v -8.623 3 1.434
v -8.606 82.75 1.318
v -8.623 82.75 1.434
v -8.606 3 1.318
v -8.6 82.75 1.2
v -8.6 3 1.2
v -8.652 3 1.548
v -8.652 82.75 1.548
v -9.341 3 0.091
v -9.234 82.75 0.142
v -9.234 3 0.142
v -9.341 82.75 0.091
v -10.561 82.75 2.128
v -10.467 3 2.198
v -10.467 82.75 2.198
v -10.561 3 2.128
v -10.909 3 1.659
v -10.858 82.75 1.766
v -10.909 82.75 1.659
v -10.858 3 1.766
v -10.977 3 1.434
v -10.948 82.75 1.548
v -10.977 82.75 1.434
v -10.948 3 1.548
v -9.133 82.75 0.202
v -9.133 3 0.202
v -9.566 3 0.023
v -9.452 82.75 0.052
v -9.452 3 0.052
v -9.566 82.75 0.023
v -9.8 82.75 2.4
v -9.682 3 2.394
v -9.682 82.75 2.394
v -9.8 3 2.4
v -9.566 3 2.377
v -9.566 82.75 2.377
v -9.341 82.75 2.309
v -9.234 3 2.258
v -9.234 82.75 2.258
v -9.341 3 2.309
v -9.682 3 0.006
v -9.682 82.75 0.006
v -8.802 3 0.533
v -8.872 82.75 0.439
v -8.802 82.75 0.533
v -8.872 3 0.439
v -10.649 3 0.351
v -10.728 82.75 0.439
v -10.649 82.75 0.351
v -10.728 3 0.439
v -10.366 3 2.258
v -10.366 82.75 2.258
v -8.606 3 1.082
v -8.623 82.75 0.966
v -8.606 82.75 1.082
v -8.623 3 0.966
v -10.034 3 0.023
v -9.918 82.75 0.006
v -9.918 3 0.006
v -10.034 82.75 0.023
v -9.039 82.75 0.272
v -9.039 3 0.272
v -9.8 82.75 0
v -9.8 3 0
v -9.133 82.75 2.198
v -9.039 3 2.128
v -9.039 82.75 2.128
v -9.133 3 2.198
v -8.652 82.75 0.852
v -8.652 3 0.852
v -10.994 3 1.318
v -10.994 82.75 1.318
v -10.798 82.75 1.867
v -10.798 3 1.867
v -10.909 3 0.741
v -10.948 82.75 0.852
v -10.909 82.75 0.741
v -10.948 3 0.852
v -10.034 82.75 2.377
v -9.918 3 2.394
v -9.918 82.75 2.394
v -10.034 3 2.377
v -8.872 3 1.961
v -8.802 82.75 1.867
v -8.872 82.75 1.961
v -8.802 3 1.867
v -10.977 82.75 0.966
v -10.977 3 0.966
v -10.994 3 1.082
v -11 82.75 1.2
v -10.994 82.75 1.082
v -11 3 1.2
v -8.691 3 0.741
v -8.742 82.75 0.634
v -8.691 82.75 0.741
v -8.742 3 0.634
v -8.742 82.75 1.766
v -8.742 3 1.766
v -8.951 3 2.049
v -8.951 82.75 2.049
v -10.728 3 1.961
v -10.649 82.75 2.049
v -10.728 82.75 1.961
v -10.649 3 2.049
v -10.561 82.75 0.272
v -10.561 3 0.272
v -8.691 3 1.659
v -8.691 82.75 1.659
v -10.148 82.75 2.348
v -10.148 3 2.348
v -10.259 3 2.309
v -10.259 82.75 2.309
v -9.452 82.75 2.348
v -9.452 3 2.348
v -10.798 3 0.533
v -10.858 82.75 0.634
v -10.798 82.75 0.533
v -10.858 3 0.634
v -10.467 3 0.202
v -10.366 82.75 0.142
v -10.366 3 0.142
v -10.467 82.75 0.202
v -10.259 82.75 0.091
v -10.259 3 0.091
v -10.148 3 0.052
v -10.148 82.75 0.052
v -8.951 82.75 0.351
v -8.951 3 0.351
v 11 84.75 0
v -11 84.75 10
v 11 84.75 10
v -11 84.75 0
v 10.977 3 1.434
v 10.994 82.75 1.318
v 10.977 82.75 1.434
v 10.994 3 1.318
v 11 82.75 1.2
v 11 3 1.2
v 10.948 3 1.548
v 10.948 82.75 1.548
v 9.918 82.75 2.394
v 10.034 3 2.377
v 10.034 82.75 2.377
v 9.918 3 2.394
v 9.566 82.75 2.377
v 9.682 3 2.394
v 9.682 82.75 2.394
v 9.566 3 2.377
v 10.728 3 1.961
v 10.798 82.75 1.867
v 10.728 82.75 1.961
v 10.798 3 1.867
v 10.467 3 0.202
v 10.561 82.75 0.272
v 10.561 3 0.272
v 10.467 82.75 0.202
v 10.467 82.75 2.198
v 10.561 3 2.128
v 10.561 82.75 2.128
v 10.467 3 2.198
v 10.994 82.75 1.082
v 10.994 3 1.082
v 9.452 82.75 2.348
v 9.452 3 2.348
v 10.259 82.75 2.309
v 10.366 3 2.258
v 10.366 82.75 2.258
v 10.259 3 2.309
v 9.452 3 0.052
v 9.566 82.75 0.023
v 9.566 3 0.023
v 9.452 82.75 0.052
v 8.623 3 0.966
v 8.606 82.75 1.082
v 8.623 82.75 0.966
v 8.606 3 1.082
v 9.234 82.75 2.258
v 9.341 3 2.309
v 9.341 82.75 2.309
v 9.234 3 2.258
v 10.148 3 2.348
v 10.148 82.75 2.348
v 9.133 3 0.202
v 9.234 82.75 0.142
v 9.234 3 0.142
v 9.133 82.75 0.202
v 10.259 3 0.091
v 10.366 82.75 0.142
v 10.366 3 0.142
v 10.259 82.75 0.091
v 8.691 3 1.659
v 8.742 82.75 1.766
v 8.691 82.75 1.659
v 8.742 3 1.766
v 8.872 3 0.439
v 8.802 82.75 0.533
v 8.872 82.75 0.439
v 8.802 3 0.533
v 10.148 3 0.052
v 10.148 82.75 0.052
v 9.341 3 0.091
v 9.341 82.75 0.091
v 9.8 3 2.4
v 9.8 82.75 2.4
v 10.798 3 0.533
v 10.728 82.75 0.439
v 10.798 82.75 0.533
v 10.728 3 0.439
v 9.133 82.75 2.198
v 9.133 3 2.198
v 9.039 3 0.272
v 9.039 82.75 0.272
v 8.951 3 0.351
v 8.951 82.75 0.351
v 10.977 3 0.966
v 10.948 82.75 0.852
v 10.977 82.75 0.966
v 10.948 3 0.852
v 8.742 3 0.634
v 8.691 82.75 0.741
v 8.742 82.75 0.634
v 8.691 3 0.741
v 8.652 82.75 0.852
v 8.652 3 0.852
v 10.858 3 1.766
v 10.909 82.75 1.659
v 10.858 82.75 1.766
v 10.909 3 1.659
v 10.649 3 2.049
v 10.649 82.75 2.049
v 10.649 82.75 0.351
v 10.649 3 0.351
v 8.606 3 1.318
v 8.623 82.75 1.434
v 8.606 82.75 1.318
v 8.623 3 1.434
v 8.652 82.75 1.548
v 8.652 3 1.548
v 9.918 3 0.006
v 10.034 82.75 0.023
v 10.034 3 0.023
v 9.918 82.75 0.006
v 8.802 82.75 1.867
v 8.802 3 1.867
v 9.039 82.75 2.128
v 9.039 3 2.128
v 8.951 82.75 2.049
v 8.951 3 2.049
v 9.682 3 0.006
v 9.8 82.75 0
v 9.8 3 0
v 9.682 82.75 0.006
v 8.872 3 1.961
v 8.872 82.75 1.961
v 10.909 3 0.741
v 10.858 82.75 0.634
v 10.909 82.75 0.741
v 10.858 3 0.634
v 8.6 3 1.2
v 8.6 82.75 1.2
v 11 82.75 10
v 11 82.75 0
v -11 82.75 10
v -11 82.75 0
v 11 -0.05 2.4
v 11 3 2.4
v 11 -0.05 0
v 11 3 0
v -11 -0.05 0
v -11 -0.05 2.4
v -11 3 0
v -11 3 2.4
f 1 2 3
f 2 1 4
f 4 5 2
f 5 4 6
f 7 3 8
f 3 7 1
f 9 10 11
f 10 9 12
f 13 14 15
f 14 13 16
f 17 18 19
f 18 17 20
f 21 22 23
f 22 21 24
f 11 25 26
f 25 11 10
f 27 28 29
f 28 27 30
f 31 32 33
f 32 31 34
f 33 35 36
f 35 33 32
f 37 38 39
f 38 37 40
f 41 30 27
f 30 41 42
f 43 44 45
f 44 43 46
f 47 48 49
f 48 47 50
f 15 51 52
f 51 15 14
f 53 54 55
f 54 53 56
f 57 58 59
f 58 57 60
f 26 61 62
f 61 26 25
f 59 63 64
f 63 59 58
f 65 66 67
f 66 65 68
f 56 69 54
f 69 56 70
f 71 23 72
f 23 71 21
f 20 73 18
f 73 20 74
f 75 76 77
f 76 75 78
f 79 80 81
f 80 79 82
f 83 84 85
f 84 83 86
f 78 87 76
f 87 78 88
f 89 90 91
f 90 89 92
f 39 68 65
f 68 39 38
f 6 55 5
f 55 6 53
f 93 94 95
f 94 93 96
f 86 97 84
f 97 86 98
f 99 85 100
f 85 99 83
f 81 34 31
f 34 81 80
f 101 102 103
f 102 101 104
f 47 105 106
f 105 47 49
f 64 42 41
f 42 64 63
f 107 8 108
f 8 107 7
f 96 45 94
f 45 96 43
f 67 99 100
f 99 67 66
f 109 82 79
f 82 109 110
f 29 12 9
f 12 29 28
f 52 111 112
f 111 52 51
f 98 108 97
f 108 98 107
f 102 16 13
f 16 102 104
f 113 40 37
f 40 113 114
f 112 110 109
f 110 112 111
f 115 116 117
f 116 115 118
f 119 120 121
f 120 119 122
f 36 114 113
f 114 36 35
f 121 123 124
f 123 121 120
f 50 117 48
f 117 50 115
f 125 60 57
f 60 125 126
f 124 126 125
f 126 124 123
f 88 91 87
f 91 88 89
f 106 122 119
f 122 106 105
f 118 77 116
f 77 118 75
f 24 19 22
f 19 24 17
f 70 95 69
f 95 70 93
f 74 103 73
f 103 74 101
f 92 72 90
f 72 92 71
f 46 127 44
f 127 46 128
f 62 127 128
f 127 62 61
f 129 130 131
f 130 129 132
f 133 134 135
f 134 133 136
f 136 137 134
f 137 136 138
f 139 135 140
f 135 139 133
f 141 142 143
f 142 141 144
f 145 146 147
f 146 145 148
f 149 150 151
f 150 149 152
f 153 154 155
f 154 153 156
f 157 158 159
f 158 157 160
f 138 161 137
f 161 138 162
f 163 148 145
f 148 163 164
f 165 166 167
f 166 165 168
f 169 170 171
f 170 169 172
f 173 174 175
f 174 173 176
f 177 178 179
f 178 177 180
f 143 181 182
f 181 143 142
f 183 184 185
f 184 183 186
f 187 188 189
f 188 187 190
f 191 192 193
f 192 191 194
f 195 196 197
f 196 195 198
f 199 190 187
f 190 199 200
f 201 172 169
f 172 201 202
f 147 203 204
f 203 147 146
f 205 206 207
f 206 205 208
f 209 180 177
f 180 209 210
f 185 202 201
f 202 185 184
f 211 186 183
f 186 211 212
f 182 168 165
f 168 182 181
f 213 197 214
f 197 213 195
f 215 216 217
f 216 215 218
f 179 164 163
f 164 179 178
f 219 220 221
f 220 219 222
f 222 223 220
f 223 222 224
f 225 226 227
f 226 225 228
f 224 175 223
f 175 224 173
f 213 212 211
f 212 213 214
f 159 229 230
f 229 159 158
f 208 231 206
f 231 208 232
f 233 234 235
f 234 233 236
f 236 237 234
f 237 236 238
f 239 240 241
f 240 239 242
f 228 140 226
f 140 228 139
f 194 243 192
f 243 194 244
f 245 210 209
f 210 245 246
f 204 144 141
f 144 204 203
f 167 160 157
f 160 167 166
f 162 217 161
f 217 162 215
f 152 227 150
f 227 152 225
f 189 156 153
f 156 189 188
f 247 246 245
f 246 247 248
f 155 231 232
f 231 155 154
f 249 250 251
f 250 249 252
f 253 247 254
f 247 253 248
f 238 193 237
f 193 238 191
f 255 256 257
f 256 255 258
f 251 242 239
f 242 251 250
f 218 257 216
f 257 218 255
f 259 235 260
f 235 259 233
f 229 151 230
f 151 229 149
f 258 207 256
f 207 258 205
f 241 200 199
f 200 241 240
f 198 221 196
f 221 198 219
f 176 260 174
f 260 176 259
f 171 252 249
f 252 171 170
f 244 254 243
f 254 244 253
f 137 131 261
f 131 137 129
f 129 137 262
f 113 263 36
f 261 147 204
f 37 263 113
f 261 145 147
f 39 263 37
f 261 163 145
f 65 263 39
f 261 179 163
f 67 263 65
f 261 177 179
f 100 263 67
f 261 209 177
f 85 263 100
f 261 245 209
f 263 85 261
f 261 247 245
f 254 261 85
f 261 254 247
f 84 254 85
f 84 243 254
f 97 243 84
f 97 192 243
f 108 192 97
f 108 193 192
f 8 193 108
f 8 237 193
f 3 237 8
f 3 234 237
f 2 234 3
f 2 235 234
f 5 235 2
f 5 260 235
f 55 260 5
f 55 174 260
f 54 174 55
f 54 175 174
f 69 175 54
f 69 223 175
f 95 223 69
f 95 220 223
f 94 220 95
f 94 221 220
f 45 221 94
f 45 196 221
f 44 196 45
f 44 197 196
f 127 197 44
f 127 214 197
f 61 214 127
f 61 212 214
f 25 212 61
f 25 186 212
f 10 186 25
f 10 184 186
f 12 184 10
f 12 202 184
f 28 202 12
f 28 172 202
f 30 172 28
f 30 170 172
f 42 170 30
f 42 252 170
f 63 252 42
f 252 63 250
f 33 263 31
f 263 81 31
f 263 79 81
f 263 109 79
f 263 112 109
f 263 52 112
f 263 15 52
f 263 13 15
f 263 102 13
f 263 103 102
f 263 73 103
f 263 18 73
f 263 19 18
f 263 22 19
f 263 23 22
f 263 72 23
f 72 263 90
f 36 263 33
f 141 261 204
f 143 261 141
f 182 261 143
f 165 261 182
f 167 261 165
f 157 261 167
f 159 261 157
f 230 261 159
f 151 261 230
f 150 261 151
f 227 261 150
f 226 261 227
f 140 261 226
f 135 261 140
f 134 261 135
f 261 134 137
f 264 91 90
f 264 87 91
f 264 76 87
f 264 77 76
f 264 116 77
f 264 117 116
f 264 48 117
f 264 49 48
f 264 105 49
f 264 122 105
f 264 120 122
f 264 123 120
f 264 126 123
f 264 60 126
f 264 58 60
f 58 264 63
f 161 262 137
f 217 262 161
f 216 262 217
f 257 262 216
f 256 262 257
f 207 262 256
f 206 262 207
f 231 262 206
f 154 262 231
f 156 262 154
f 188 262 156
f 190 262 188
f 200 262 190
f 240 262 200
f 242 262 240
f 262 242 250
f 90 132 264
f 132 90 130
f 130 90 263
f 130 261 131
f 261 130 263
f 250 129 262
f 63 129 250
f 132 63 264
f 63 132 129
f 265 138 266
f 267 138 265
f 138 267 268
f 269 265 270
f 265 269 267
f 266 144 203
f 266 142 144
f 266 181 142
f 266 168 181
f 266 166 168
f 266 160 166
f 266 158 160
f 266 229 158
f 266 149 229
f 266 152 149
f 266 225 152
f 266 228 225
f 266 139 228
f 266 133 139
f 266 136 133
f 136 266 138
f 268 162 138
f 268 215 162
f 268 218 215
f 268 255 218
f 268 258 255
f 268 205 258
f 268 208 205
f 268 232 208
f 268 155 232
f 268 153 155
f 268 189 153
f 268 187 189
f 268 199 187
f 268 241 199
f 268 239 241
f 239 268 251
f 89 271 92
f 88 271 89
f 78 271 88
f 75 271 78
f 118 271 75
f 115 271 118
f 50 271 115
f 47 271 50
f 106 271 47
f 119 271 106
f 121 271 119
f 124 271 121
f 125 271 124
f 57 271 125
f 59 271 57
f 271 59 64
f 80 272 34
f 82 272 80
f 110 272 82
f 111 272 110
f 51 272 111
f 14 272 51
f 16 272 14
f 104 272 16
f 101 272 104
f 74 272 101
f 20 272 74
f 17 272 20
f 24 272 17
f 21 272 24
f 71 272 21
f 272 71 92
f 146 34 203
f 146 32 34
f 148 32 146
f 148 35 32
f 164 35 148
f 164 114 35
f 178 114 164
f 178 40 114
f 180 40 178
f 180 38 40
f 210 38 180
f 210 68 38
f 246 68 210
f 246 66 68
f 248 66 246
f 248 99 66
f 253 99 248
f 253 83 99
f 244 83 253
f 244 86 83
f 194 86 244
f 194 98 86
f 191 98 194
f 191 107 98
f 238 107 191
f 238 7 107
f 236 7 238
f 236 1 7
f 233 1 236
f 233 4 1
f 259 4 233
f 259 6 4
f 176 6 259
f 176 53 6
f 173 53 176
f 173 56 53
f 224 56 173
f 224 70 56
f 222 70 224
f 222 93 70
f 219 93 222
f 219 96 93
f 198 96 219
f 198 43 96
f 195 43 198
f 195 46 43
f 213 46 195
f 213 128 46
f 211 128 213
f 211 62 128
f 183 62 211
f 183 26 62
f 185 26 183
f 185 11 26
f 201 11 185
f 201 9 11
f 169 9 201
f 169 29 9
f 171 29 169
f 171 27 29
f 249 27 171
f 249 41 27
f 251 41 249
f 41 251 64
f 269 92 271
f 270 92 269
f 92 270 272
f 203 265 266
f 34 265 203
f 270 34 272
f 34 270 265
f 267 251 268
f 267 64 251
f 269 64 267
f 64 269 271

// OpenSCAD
include <_climbing_frame.scad>

// Print two.
scale(s) swing_print();
